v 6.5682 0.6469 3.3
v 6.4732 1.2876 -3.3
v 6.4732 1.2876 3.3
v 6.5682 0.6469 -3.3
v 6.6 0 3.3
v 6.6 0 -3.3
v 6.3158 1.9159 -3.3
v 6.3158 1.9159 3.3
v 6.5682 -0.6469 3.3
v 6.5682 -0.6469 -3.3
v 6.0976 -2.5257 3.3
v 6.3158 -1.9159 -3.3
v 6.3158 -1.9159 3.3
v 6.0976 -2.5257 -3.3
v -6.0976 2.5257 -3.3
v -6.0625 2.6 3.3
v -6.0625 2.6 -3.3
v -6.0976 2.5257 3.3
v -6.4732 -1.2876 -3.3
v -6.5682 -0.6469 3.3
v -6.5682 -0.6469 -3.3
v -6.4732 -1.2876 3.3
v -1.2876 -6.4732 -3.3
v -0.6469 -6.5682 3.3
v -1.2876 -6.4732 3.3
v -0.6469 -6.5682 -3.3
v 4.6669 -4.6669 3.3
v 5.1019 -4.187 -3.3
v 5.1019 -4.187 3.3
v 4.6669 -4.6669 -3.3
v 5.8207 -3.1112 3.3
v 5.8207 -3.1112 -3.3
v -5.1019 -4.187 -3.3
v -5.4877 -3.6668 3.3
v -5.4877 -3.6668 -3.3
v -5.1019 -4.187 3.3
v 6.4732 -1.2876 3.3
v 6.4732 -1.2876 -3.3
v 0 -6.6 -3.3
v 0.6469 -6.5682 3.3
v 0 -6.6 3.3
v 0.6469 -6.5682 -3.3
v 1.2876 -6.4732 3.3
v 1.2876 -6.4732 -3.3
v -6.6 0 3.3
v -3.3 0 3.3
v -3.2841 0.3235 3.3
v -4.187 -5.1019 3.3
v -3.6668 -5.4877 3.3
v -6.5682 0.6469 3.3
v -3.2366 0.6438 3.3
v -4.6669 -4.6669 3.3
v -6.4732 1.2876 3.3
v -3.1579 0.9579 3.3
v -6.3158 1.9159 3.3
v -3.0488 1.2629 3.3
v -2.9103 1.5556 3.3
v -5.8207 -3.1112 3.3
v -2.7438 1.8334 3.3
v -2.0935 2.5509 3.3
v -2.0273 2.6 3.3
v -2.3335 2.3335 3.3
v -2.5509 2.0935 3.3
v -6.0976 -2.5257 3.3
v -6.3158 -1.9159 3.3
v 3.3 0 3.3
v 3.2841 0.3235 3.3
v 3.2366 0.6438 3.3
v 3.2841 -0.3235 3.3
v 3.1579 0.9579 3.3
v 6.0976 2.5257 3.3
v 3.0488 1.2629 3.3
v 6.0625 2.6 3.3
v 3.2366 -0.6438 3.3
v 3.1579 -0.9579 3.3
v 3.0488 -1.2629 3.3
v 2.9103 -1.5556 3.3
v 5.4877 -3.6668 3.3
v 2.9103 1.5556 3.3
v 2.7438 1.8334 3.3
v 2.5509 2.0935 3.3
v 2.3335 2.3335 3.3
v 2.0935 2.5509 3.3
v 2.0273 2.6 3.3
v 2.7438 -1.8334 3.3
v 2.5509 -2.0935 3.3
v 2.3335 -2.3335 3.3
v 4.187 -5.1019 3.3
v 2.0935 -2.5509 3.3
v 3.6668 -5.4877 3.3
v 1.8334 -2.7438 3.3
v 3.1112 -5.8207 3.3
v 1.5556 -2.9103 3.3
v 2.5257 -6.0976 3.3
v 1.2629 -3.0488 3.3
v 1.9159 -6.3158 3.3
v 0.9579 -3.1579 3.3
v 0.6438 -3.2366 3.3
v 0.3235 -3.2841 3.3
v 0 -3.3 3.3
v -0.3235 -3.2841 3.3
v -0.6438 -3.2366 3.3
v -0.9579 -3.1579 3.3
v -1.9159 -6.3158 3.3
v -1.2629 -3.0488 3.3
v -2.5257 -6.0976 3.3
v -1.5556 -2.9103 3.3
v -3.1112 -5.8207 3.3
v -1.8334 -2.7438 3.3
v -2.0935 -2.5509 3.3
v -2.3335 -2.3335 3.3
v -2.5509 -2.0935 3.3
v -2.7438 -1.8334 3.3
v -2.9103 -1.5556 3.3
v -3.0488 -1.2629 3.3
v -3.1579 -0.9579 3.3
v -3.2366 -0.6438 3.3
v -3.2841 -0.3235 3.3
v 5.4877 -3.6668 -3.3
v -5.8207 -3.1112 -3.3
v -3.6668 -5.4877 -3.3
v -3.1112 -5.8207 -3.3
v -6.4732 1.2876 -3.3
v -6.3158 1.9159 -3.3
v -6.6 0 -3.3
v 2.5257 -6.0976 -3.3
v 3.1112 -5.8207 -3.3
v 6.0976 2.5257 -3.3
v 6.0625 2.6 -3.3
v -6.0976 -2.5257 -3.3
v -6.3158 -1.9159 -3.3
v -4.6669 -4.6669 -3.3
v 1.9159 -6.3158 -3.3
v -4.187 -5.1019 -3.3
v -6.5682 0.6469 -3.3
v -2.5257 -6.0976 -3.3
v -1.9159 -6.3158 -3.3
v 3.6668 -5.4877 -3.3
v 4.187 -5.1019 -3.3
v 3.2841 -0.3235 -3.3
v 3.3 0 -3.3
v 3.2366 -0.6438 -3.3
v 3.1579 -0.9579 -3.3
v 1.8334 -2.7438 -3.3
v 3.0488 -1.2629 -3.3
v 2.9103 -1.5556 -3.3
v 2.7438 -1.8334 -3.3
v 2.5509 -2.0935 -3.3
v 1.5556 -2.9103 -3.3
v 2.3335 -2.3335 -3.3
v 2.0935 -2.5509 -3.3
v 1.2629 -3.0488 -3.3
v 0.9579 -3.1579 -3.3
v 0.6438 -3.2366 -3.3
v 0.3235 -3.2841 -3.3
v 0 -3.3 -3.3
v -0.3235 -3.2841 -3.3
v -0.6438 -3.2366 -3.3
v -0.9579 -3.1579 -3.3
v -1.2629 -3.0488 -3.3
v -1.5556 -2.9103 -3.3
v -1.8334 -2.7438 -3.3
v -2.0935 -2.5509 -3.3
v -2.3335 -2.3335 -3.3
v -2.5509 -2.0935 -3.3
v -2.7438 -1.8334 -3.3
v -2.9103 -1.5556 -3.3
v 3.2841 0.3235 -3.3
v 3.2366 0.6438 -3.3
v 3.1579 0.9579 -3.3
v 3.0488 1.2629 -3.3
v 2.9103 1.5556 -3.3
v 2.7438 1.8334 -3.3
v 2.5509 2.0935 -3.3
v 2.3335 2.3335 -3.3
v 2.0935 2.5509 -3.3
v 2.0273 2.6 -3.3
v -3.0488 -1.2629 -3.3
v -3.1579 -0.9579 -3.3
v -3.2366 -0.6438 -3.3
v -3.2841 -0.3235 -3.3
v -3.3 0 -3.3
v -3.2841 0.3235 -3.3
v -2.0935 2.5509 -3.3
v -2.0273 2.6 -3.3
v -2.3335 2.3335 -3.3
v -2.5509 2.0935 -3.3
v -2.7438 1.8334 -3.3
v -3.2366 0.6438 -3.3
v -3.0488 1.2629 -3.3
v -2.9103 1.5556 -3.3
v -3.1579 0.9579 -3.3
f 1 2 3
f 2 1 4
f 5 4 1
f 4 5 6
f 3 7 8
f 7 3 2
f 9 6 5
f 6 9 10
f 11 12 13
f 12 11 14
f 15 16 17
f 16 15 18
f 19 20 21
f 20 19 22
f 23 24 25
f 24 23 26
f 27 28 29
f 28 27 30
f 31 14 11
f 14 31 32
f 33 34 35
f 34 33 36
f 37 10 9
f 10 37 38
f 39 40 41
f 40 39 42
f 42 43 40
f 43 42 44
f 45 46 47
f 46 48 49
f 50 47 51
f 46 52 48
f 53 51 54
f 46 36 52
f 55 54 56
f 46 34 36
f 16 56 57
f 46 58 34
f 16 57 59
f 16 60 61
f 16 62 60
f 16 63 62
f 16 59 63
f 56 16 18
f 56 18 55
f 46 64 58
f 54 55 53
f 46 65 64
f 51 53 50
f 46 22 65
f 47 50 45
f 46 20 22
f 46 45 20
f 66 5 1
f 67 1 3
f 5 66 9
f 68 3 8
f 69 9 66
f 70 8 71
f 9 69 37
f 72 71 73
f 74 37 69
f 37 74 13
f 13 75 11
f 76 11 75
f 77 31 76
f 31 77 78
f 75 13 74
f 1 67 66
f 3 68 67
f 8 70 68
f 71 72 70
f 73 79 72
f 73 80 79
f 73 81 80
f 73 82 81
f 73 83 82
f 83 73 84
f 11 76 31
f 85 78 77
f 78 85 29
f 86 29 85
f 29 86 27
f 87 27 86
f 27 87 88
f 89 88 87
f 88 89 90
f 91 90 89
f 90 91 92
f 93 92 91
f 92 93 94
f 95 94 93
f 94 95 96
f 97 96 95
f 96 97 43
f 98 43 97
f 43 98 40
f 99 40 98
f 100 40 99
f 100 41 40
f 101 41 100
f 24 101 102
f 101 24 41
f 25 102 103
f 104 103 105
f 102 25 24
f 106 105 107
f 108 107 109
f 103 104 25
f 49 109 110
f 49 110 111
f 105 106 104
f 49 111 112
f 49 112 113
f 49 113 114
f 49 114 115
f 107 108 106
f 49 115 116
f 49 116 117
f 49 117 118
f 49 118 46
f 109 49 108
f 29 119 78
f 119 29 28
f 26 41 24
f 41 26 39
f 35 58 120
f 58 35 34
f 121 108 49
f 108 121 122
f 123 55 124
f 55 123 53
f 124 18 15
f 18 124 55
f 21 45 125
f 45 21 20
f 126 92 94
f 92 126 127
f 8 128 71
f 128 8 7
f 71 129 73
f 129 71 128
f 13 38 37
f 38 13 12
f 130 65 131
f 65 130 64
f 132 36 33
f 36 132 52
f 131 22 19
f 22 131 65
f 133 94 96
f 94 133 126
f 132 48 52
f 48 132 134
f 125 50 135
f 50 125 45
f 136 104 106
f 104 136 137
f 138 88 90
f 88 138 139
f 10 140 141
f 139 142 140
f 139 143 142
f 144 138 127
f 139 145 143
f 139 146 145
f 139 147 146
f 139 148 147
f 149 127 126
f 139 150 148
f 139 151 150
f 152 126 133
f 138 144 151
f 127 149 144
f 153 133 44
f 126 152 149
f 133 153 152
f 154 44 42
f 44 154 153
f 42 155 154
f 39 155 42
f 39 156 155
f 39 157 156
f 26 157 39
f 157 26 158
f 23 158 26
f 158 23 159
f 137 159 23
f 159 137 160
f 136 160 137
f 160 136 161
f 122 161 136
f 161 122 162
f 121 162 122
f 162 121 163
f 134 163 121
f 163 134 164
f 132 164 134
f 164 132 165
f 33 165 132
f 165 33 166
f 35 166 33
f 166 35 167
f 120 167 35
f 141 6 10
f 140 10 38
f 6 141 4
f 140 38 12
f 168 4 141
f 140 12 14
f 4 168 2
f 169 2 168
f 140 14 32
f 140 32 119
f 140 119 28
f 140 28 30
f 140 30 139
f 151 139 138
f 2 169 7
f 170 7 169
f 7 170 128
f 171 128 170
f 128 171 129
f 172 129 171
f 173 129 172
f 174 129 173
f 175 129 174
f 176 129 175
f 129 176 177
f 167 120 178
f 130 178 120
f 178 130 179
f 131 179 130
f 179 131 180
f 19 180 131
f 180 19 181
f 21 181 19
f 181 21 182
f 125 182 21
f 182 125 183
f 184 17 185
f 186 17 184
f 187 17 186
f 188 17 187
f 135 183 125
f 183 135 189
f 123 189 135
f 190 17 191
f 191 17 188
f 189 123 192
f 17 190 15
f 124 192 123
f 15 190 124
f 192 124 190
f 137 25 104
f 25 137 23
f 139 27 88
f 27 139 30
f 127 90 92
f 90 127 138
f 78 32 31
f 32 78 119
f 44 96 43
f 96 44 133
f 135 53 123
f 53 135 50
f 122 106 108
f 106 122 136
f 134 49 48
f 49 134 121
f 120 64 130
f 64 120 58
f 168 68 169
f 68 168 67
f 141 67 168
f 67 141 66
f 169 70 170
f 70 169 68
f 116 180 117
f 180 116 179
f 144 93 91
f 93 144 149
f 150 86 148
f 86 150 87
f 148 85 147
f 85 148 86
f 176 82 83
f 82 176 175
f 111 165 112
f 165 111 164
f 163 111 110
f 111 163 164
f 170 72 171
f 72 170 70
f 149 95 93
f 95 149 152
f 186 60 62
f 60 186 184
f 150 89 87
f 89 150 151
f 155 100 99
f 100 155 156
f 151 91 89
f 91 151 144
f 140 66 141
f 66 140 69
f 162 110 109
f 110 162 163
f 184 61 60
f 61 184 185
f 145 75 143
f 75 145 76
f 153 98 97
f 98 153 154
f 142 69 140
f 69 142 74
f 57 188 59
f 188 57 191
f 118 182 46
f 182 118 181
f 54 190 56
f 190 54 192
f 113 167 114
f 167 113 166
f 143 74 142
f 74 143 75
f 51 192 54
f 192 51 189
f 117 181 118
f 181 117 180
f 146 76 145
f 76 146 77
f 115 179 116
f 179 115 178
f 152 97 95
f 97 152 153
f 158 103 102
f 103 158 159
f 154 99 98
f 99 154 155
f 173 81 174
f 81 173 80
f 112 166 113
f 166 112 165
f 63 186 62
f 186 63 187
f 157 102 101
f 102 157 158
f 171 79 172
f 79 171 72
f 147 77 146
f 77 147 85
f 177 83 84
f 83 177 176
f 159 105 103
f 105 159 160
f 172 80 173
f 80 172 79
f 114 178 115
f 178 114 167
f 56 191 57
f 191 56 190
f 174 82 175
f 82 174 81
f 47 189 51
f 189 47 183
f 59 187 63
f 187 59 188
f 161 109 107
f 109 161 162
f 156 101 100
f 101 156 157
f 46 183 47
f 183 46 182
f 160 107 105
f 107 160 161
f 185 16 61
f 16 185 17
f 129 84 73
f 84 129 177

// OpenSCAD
// COBRA Vertebra - T12 V18
// Height: 6.6000000000000005mm, OD: 13.200000000000001mm

$fn = 64;

difference() {
    // Outer cylinder
    cylinder(h=6.6000000000000005, d=13.200000000000001, center=true);
    
    // Inner channel
    cylinder(h=8.600000000000001, d=6.6000000000000005, center=true);

    // Solar panel cavity
    translate([0, 4.6000000000000005, 0])
    cube([50, 4, 30], center=true);

    // Pivot holes
    translate([0, 6.6000000000000005, 0.30000000000000027])
    rotate([90, 0, 0])
    cylinder(h=5.300000000000001, d=4, center=true);
    
    translate([0, 6.6000000000000005, -0.30000000000000027])
    rotate([90, 0, 0])
    cylinder(h=5.300000000000001, d=4, center=true);
}
